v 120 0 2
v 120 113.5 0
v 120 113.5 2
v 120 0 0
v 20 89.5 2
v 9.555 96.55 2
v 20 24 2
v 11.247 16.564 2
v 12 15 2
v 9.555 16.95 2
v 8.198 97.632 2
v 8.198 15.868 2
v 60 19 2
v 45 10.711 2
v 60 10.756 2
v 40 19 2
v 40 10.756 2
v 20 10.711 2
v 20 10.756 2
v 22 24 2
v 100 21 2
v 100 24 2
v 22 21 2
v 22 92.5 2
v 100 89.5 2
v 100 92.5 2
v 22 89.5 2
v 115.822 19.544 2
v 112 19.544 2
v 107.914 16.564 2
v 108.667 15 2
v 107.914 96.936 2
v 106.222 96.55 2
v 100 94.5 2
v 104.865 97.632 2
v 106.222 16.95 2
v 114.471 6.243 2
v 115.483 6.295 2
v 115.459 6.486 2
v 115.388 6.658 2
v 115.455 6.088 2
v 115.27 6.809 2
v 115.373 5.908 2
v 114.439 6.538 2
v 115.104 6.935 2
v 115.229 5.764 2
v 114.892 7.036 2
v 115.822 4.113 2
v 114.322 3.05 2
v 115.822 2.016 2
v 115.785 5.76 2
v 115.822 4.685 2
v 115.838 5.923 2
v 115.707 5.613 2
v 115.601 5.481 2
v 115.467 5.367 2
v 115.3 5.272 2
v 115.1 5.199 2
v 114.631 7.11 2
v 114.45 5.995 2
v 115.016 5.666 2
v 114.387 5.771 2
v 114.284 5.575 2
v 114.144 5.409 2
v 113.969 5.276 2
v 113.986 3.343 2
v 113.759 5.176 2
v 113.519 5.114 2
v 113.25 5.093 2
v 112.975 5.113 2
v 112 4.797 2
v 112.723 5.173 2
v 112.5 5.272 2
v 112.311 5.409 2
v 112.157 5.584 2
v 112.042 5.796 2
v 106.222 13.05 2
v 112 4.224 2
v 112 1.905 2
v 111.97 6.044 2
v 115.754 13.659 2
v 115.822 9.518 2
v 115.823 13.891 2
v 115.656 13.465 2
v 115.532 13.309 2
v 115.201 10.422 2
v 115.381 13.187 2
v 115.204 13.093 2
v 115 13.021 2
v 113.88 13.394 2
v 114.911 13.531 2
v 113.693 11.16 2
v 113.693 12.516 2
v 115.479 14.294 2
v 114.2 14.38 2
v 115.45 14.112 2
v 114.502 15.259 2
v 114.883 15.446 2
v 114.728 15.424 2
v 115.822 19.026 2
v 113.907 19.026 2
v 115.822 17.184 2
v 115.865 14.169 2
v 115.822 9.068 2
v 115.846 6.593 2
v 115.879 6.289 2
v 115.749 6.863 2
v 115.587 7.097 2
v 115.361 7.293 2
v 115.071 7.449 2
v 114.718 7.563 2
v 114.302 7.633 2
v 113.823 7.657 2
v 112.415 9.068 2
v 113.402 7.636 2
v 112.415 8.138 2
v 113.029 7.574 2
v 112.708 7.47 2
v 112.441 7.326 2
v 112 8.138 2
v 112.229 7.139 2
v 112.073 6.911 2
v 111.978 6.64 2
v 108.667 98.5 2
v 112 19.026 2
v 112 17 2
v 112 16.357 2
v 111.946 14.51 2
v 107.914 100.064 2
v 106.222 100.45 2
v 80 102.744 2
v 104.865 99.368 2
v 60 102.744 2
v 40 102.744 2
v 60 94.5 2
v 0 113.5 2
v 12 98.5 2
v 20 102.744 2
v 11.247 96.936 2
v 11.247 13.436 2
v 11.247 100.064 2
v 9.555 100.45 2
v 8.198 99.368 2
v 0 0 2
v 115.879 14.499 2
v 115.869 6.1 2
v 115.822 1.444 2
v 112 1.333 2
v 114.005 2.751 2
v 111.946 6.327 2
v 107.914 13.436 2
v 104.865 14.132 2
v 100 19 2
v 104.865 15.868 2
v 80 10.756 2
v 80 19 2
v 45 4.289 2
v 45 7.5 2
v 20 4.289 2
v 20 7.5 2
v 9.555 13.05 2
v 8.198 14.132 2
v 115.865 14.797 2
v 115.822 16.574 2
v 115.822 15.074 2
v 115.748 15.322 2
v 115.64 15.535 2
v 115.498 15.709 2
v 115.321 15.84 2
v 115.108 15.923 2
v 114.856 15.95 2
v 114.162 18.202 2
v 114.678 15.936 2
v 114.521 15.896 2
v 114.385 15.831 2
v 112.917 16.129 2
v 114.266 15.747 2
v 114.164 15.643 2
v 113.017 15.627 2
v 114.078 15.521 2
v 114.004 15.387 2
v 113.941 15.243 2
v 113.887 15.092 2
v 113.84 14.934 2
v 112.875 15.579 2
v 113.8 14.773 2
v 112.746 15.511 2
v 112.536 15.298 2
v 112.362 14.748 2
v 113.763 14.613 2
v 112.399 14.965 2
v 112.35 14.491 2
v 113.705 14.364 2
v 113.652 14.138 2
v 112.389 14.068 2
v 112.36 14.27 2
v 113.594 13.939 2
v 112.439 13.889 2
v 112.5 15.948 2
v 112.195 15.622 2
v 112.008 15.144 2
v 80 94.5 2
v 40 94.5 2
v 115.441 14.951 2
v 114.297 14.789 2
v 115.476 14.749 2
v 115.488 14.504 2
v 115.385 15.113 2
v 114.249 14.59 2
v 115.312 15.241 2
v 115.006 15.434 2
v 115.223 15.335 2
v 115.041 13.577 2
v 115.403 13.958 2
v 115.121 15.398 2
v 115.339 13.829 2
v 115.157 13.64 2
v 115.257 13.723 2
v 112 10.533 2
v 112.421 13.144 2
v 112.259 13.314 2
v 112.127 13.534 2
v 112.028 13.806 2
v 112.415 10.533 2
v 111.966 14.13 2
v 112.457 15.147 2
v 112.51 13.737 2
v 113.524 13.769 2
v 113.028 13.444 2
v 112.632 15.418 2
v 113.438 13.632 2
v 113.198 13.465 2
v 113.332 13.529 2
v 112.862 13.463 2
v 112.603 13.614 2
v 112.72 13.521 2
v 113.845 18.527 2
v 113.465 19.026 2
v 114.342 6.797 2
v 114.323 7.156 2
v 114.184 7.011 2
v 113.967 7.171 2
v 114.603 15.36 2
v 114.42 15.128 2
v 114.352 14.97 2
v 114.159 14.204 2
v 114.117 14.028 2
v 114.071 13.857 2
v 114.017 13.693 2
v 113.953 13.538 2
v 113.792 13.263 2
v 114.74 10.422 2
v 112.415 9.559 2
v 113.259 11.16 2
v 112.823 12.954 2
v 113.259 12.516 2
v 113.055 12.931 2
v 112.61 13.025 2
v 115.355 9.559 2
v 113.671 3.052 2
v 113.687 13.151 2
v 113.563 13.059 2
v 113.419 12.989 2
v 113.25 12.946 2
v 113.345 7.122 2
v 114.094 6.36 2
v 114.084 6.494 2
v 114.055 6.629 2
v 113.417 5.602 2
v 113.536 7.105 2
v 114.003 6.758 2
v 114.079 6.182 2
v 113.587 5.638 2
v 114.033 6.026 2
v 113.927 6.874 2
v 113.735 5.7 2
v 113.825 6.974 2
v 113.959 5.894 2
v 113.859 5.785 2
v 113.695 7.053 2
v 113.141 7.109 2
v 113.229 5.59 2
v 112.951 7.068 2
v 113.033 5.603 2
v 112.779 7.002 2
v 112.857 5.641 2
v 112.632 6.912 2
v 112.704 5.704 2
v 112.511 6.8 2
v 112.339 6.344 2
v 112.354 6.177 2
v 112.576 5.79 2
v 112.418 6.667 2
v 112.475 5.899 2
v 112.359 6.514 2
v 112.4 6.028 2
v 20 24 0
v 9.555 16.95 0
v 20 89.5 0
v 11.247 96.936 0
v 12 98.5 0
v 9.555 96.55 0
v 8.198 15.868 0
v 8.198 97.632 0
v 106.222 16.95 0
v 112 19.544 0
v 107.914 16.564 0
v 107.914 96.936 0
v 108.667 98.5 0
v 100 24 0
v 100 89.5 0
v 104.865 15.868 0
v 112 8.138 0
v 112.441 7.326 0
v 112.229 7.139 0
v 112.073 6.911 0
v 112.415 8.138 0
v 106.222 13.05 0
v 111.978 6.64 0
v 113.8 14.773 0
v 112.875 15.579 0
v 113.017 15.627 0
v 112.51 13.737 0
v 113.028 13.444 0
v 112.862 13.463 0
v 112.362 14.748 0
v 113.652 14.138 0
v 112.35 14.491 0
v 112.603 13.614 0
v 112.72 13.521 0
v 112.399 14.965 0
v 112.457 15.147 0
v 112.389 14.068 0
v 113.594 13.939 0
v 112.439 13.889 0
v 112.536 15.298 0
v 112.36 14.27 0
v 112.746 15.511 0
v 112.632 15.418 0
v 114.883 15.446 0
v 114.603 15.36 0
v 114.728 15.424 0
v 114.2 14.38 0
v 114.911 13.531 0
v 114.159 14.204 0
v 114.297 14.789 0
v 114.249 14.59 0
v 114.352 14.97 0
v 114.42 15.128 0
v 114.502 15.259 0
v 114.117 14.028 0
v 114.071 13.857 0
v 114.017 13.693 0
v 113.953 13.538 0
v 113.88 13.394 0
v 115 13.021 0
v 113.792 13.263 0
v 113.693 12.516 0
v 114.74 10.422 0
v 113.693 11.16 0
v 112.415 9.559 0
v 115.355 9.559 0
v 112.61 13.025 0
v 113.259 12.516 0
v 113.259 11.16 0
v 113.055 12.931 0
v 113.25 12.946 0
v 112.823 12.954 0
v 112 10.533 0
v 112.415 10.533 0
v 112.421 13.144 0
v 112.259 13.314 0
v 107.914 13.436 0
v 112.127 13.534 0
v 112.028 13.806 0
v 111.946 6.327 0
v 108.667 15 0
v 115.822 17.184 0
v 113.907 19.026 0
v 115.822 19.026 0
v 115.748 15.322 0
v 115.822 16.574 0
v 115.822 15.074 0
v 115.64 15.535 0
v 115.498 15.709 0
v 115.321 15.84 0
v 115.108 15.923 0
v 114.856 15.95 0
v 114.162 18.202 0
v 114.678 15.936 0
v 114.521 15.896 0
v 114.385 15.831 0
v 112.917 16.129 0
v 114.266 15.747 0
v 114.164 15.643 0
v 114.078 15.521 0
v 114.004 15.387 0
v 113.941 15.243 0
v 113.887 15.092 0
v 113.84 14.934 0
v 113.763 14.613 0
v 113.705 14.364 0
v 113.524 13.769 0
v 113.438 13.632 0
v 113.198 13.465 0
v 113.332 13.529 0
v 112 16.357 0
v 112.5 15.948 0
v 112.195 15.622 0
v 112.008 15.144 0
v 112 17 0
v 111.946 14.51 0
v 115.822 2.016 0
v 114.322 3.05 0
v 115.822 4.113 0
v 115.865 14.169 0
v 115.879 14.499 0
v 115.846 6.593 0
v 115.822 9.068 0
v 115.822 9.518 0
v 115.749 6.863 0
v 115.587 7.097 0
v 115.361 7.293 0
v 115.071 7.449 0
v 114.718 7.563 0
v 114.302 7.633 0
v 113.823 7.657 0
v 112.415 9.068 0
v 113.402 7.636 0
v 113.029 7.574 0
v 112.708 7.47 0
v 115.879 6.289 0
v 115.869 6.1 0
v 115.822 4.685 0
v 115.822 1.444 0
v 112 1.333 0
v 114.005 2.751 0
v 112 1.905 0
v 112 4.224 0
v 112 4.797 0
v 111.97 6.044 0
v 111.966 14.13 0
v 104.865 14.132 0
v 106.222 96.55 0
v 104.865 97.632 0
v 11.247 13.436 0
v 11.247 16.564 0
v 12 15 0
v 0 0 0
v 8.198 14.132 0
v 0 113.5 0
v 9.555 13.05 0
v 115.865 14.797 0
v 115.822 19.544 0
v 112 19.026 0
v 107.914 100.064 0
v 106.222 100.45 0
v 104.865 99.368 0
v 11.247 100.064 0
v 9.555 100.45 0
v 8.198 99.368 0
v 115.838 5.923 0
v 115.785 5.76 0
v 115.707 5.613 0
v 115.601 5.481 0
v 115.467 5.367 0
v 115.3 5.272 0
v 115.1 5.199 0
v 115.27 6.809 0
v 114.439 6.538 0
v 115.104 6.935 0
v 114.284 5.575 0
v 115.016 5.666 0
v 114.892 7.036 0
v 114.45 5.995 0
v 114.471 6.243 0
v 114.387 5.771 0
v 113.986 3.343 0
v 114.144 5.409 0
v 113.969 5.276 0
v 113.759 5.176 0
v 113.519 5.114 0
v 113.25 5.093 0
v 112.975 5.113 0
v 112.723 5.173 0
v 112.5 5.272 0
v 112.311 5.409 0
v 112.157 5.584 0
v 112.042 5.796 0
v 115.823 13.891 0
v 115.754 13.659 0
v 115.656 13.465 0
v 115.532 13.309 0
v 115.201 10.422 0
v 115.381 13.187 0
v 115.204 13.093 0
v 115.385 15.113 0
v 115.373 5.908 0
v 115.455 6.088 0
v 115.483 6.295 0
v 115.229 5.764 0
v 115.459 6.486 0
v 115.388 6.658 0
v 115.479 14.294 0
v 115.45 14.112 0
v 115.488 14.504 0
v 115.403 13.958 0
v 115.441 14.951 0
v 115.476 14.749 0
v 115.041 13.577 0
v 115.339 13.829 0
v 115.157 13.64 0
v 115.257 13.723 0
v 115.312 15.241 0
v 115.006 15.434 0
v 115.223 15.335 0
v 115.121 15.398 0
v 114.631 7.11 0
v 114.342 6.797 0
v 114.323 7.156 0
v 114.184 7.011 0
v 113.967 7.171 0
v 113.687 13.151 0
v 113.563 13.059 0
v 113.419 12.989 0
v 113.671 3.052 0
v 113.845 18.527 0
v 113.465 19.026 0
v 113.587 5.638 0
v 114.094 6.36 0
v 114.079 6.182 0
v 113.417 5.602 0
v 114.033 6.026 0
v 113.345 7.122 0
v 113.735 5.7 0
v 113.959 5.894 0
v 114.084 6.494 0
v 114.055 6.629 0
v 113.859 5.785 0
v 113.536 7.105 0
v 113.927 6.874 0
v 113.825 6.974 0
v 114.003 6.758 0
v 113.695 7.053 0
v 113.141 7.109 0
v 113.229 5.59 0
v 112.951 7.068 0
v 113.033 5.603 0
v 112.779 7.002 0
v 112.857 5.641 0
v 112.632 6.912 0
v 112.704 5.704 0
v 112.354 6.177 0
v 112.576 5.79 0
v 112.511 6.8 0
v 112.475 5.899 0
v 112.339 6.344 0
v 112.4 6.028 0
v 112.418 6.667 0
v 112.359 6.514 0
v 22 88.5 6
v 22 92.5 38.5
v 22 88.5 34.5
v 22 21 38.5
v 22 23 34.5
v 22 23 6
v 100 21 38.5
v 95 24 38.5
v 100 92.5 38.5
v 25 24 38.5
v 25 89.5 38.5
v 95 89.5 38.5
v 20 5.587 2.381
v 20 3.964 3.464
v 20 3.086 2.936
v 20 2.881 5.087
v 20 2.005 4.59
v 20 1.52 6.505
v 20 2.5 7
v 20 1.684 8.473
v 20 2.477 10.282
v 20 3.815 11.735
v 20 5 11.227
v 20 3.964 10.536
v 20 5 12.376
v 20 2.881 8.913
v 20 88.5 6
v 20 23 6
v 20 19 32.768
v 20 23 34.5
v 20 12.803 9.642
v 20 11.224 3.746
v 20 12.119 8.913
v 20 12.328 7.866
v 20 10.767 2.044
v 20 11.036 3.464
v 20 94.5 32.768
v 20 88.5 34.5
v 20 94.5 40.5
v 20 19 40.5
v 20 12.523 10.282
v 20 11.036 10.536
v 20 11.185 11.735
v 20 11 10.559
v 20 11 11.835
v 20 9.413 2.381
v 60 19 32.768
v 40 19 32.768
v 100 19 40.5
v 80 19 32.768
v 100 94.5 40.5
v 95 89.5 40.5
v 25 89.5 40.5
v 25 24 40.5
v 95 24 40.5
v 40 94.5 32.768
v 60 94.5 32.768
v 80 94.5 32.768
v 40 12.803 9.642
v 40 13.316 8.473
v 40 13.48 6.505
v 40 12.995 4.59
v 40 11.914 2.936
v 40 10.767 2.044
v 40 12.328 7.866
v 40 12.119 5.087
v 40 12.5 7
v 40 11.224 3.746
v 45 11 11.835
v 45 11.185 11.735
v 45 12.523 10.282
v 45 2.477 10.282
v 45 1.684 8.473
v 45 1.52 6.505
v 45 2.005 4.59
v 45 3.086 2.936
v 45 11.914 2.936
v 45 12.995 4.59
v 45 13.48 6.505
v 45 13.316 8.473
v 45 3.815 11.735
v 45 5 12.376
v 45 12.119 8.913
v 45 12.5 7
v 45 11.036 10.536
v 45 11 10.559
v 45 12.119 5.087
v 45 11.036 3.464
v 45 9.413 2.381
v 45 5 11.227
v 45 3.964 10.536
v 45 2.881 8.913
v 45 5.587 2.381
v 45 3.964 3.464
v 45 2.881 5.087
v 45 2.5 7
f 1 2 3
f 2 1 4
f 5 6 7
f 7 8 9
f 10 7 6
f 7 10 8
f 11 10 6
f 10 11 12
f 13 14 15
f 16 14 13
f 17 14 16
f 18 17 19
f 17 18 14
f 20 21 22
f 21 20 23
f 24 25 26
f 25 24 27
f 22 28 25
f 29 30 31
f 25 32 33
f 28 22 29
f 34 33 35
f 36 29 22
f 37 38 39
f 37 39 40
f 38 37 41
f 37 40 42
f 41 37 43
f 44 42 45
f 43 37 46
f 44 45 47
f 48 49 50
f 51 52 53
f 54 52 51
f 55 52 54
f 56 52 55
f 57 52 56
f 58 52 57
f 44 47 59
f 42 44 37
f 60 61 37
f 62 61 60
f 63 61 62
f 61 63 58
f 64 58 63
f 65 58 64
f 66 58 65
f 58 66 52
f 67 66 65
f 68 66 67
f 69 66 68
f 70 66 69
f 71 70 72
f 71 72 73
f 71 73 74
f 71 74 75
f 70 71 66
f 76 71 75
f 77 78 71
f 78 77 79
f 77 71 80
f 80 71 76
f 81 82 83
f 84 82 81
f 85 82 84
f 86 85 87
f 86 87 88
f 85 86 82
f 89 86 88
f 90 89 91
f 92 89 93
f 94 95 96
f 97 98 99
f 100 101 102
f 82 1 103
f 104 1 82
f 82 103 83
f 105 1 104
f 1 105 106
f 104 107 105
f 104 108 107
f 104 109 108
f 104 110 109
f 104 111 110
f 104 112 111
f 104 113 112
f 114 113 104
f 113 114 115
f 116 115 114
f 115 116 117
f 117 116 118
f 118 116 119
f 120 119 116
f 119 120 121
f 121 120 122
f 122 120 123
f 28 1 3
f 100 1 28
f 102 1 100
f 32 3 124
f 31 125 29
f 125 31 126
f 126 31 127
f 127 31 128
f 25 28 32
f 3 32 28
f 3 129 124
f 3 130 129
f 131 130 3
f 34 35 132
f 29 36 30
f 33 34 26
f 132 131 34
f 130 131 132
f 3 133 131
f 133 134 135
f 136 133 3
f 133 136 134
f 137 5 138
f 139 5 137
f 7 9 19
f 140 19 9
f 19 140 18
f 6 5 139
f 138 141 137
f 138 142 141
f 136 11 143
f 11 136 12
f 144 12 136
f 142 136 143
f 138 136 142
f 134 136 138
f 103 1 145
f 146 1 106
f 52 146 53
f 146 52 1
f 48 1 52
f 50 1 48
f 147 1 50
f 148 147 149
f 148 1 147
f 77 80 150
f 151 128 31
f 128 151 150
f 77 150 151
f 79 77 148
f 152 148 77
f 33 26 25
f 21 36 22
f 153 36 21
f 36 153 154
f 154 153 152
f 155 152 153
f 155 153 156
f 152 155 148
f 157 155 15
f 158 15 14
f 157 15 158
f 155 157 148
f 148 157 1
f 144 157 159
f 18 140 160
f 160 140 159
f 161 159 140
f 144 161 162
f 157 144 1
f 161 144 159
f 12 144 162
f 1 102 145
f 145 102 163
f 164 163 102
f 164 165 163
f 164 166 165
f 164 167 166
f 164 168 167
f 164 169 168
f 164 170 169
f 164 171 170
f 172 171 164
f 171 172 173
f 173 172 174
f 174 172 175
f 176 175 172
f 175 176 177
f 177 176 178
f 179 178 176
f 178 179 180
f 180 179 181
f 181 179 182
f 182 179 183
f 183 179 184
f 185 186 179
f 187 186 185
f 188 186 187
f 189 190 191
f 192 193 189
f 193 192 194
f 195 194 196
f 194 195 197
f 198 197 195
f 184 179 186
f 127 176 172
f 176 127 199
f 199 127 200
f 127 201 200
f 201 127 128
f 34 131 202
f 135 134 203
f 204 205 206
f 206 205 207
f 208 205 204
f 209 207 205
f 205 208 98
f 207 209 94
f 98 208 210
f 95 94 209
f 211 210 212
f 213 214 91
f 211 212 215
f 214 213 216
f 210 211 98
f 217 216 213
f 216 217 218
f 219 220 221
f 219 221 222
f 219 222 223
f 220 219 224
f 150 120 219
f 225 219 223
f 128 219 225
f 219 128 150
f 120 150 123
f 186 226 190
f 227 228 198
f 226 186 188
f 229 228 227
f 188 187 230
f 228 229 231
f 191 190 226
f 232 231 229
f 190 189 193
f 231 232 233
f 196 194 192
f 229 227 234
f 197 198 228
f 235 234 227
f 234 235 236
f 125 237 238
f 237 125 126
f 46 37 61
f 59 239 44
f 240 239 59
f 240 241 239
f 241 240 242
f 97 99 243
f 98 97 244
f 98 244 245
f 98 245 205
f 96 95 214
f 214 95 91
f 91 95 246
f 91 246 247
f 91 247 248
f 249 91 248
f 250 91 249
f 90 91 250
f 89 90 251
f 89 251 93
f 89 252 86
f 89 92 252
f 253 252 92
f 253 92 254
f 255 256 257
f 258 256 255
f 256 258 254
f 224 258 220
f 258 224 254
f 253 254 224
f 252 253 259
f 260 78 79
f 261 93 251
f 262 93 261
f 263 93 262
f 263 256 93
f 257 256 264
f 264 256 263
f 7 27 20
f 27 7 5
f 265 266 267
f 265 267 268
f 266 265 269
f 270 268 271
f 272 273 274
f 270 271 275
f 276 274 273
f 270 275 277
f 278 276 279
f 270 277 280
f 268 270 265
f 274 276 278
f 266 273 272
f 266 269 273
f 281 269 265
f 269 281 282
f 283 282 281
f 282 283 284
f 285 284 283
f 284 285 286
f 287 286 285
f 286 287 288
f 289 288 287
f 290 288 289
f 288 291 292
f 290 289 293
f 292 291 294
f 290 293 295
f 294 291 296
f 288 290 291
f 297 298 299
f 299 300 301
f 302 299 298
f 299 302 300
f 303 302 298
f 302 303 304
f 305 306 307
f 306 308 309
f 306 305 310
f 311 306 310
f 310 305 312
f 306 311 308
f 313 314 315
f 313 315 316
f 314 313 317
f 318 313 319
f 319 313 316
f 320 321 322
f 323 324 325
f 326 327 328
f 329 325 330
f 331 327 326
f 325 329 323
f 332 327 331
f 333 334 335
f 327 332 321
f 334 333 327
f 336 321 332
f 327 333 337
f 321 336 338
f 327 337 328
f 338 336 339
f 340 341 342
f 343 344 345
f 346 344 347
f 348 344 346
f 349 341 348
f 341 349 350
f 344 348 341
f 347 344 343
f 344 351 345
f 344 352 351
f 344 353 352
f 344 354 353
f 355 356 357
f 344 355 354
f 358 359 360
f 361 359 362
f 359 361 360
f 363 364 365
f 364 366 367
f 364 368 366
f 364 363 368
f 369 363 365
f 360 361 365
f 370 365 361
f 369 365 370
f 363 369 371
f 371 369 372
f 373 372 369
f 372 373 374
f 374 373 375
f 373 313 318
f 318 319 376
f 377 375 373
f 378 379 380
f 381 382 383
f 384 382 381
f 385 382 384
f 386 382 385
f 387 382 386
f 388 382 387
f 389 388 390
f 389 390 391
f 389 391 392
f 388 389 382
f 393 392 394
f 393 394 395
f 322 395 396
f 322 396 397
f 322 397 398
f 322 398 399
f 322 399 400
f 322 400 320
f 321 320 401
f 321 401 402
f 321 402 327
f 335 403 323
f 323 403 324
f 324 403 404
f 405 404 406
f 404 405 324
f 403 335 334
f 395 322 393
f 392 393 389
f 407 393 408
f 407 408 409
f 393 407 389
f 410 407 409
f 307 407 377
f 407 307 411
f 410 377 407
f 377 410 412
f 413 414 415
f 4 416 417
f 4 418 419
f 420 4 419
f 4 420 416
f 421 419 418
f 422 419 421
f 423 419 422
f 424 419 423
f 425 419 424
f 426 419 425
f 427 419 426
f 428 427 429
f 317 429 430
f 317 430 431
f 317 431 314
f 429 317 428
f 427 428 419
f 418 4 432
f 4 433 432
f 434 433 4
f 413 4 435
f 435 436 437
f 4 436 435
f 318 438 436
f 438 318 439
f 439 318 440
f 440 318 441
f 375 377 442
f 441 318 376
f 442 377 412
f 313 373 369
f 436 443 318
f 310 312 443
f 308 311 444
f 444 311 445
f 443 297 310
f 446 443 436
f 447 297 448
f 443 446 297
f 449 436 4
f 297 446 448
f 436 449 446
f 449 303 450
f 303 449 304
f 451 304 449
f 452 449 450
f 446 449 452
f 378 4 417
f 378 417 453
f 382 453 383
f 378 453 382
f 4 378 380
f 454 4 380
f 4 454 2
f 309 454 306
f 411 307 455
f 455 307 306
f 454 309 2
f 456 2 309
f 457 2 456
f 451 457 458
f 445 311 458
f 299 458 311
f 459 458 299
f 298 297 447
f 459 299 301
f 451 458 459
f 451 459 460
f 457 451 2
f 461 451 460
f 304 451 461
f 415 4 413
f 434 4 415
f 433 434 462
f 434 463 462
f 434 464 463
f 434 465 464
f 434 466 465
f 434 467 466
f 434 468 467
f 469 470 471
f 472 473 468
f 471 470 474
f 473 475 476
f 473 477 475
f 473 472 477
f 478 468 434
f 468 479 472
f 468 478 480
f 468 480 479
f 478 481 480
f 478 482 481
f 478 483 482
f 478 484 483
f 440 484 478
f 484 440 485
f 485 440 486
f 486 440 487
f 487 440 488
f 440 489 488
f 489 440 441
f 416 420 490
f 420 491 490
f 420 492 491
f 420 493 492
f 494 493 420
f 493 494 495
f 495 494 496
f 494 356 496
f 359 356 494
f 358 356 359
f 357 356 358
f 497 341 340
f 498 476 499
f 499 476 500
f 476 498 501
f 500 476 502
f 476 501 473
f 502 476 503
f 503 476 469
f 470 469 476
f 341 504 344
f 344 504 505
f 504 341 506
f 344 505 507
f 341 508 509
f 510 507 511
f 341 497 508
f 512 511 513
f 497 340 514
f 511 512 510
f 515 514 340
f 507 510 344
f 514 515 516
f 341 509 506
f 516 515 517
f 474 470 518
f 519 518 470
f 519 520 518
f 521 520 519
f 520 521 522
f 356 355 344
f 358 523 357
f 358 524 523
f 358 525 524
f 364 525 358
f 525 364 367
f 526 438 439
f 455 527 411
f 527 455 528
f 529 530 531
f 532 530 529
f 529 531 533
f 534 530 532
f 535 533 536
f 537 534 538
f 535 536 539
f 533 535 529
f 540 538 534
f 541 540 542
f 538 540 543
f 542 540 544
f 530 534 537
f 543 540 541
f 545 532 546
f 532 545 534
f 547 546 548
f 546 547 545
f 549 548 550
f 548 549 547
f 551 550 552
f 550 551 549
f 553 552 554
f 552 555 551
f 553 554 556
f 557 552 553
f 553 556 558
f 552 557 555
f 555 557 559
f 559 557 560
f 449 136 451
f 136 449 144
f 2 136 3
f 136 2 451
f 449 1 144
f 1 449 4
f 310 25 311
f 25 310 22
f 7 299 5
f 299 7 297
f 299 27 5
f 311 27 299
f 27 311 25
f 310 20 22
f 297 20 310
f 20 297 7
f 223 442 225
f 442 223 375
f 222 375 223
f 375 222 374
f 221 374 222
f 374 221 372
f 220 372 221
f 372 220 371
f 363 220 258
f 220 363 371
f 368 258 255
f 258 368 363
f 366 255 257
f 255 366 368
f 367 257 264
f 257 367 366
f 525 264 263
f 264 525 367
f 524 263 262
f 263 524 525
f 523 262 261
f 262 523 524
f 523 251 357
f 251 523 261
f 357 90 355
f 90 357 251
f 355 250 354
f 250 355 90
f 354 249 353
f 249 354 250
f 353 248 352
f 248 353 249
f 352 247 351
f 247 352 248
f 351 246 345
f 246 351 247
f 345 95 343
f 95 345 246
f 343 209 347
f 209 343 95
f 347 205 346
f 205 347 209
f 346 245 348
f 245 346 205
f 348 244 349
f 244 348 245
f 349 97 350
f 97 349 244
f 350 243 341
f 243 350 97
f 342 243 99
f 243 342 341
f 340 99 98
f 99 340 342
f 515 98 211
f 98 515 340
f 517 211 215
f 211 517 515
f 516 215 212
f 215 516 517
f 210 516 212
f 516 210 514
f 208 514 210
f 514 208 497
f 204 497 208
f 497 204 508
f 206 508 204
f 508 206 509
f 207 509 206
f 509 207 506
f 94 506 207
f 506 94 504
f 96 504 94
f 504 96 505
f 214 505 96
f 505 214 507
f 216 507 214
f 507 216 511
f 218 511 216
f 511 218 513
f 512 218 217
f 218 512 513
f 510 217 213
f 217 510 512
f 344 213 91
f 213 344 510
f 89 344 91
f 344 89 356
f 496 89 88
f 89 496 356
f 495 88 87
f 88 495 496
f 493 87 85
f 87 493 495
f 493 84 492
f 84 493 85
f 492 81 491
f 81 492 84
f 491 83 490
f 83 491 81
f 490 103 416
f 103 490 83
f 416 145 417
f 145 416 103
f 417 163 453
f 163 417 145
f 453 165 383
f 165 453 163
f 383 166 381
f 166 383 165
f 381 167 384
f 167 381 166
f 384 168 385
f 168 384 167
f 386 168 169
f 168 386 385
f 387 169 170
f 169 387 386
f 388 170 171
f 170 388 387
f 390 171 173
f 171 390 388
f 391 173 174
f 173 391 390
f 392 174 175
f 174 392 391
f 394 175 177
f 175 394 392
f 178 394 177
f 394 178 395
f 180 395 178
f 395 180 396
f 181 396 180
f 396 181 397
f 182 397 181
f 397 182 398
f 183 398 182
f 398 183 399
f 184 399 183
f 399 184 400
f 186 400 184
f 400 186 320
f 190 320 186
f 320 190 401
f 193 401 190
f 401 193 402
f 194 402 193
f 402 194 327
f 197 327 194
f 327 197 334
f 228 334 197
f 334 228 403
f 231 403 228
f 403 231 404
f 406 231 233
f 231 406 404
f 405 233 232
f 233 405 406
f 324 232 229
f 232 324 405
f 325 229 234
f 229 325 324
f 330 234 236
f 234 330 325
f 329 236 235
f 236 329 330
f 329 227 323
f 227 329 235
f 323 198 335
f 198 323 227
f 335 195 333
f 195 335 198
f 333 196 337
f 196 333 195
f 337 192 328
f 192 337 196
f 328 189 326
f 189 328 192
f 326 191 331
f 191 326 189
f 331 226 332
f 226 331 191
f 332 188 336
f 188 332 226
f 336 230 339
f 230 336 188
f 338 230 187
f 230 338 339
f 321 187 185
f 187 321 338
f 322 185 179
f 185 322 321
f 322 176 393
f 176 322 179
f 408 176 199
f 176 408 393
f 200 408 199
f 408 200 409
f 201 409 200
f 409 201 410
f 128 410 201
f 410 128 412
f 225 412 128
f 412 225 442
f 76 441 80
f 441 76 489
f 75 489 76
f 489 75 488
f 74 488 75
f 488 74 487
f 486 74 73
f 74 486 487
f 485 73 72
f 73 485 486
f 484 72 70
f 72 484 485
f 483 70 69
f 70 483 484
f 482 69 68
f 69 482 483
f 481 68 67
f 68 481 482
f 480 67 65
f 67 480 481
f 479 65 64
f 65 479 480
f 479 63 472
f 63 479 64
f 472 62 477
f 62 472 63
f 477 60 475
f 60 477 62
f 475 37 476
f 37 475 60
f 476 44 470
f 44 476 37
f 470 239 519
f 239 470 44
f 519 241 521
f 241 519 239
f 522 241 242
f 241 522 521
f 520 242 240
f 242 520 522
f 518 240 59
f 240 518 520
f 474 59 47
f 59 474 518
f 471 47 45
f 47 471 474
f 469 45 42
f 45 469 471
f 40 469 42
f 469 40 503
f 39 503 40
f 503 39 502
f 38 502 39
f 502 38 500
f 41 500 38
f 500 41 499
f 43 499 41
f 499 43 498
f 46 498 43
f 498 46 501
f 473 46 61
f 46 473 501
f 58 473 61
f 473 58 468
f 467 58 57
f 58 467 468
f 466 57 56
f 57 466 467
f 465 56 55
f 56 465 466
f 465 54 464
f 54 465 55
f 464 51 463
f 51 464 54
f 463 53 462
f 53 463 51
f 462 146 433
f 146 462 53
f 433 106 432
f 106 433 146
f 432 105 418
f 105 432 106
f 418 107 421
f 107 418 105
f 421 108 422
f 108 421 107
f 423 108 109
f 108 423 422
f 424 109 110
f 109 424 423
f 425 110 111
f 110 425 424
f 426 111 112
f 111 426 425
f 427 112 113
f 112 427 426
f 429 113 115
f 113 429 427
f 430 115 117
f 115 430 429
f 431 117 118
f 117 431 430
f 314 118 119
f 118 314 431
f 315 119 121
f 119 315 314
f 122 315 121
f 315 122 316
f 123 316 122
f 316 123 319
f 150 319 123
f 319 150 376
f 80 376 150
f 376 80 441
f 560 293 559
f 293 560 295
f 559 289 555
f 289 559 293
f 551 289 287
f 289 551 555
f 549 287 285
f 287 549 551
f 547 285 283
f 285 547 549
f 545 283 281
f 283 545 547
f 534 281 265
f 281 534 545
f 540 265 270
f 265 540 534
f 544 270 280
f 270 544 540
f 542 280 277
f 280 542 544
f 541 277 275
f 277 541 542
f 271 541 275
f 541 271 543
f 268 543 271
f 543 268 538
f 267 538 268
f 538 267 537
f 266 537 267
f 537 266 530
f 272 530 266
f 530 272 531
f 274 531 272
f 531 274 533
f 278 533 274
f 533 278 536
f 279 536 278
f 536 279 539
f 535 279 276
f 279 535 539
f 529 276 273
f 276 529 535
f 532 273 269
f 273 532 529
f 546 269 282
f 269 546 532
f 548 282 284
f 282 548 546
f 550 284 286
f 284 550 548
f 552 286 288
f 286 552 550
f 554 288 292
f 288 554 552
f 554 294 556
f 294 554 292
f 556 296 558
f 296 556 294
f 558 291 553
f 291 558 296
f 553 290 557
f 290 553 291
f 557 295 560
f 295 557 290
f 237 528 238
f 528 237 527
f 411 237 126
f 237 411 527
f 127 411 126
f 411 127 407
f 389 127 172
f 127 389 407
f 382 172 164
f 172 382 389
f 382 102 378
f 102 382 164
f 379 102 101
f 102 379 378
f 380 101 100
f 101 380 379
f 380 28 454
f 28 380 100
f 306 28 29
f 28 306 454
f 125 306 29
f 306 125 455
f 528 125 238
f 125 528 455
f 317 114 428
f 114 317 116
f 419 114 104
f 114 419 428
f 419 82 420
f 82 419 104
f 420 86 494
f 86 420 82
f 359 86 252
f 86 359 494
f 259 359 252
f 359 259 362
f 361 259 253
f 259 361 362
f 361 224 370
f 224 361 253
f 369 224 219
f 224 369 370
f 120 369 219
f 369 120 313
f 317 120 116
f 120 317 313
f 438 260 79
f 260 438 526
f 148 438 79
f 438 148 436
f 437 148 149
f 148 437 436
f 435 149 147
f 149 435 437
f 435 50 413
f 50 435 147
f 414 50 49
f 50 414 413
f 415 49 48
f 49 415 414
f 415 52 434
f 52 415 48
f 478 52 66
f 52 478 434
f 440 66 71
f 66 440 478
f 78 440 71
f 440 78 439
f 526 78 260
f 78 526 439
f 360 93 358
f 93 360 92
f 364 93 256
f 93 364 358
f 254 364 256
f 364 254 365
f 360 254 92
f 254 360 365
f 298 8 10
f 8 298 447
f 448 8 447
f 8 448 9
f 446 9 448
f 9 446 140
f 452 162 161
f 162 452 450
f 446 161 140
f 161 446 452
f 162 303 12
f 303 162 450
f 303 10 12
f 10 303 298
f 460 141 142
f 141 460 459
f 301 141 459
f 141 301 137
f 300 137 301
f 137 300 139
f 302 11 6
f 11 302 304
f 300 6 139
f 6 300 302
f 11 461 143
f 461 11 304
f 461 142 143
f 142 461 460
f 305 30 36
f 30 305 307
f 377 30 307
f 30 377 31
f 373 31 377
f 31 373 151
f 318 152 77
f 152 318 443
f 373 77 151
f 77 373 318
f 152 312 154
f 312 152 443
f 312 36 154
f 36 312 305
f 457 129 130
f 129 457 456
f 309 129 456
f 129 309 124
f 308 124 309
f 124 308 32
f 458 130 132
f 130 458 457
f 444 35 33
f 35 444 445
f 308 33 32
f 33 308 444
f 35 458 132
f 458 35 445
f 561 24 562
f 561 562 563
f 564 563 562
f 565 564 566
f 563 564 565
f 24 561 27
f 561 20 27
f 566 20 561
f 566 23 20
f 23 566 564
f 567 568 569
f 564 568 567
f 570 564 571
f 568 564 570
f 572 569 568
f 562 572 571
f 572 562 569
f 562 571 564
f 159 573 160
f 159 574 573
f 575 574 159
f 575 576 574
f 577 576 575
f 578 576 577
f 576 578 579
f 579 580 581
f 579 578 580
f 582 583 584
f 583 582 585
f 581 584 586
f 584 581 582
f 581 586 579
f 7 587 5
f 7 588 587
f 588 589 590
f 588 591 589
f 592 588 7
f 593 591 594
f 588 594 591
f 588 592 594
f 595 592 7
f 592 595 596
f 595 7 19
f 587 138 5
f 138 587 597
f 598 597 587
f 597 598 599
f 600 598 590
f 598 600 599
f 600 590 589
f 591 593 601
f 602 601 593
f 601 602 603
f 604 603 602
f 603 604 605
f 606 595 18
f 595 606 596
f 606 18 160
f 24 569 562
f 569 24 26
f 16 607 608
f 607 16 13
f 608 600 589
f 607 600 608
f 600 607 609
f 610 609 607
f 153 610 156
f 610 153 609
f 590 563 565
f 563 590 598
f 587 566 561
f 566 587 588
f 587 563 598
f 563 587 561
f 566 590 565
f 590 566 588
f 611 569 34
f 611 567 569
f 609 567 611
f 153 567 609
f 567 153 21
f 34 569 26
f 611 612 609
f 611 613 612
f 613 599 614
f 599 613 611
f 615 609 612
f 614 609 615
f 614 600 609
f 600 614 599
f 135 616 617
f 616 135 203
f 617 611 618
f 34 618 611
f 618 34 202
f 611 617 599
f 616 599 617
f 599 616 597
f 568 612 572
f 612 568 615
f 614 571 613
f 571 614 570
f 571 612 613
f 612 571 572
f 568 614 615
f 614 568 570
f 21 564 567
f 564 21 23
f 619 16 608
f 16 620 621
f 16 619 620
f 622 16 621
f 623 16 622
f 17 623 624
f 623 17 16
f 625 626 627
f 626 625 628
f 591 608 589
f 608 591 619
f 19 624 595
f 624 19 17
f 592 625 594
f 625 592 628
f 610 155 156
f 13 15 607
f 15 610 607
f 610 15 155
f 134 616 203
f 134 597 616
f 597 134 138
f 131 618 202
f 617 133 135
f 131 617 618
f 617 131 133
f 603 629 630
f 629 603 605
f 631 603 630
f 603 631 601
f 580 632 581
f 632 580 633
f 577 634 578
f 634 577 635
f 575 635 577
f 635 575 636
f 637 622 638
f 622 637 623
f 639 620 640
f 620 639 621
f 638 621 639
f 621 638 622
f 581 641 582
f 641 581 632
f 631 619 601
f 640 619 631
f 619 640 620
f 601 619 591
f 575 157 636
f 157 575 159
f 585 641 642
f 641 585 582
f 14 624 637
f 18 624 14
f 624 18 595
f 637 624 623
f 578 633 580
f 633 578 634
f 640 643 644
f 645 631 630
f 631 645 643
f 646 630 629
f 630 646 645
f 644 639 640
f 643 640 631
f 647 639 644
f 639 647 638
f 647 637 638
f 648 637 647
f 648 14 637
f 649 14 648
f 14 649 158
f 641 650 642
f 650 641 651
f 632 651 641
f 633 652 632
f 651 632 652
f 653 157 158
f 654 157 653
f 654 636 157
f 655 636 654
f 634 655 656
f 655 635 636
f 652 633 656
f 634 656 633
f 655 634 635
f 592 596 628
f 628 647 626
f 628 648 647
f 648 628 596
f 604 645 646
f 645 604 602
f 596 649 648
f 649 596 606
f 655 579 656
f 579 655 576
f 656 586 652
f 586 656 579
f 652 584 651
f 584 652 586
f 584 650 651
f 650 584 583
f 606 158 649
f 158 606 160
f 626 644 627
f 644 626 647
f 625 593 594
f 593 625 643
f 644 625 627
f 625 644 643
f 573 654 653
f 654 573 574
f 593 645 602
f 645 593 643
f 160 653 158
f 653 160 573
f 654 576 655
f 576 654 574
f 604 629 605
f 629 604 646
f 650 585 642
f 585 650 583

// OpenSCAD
// holder
width =     160/2;
depth =     73.5;
height = 36.5;
thick =       2;
plateSpacing = 40;
holder = 4;

difference() {
    cube([width + plateSpacing , depth + plateSpacing ,  thick]);
    translate([plateSpacing / 2, holder + plateSpacing / 2, -1]) cube([width , depth - (holder * 2) ,  thick + 2]);
    translate([width+ plateSpacing - 8,  20, -1]) rotate([0,  0, -90]) linear_extrude(height = 10) {
        text("KS-16X", size = 4);
    }
    translate([(plateSpacing)/4 , plateSpacing / 2 - 5, -1])cylinder(20, 2,2);
    translate([(plateSpacing)/4 , depth + plateSpacing / 2 + 5 , -1])cylinder(20, 2,2);
    translate([width + plateSpacing / 1.5, plateSpacing / 2 - 5, -1])cylinder(20, 2,2);
    translate([width + plateSpacing / 1.5, depth + plateSpacing / 2 + 5 , -1])cylinder(20, 2,2);
}

module case() {
    cube([width, thick, height]);
    translate([0, depth,0]) cube([width, thick, height]);
    bottomHole = 4;
    difference() {
        cube([thick, depth, height]);
        translate([-10, bottomHole, bottomHole]) cube([20, depth - bottomHole * 2 , height - bottomHole * 2]);
    }

    topHole = 5;
    translate([0, 0, height]) difference() {
        cube([width, depth  + thick, 2]);
        translate([topHole, topHole, -5]) cube([width - topHole * 2, depth + 2 - topHole * 2 , 10]);
    }
}

translate([plateSpacing / 2, (plateSpacing / 2) -( holder / 4), thick]) case();

module support() {
    translate([0,0, height]) { 
        rotate([0,180,180])difference() {
        cube([20, 20, height]);
        rotate([-15, 0, 0]) translate([-5, 0,  -5]) cube([40, 40, height + 20]);
        }
    }
}
translate([20,20,0])support();
translate([60,20,0])support();

translate([20, depth + plateSpacing / 2, 0]) mirror([0,1,0]) support();
translate([60, depth + plateSpacing / 2, 0]) mirror([0,1,0]) support();

translate([45, 7.5, 7]) {
    rotate([0, -90, 0])
    difference() {
      cylinder(25, 6, 6);
      translate([0,0,-2.5])cylinder(30, 5, 5);
       translate([2.5,-2.5,-2.5]) cube([10,6, 50]); 
    }
}
